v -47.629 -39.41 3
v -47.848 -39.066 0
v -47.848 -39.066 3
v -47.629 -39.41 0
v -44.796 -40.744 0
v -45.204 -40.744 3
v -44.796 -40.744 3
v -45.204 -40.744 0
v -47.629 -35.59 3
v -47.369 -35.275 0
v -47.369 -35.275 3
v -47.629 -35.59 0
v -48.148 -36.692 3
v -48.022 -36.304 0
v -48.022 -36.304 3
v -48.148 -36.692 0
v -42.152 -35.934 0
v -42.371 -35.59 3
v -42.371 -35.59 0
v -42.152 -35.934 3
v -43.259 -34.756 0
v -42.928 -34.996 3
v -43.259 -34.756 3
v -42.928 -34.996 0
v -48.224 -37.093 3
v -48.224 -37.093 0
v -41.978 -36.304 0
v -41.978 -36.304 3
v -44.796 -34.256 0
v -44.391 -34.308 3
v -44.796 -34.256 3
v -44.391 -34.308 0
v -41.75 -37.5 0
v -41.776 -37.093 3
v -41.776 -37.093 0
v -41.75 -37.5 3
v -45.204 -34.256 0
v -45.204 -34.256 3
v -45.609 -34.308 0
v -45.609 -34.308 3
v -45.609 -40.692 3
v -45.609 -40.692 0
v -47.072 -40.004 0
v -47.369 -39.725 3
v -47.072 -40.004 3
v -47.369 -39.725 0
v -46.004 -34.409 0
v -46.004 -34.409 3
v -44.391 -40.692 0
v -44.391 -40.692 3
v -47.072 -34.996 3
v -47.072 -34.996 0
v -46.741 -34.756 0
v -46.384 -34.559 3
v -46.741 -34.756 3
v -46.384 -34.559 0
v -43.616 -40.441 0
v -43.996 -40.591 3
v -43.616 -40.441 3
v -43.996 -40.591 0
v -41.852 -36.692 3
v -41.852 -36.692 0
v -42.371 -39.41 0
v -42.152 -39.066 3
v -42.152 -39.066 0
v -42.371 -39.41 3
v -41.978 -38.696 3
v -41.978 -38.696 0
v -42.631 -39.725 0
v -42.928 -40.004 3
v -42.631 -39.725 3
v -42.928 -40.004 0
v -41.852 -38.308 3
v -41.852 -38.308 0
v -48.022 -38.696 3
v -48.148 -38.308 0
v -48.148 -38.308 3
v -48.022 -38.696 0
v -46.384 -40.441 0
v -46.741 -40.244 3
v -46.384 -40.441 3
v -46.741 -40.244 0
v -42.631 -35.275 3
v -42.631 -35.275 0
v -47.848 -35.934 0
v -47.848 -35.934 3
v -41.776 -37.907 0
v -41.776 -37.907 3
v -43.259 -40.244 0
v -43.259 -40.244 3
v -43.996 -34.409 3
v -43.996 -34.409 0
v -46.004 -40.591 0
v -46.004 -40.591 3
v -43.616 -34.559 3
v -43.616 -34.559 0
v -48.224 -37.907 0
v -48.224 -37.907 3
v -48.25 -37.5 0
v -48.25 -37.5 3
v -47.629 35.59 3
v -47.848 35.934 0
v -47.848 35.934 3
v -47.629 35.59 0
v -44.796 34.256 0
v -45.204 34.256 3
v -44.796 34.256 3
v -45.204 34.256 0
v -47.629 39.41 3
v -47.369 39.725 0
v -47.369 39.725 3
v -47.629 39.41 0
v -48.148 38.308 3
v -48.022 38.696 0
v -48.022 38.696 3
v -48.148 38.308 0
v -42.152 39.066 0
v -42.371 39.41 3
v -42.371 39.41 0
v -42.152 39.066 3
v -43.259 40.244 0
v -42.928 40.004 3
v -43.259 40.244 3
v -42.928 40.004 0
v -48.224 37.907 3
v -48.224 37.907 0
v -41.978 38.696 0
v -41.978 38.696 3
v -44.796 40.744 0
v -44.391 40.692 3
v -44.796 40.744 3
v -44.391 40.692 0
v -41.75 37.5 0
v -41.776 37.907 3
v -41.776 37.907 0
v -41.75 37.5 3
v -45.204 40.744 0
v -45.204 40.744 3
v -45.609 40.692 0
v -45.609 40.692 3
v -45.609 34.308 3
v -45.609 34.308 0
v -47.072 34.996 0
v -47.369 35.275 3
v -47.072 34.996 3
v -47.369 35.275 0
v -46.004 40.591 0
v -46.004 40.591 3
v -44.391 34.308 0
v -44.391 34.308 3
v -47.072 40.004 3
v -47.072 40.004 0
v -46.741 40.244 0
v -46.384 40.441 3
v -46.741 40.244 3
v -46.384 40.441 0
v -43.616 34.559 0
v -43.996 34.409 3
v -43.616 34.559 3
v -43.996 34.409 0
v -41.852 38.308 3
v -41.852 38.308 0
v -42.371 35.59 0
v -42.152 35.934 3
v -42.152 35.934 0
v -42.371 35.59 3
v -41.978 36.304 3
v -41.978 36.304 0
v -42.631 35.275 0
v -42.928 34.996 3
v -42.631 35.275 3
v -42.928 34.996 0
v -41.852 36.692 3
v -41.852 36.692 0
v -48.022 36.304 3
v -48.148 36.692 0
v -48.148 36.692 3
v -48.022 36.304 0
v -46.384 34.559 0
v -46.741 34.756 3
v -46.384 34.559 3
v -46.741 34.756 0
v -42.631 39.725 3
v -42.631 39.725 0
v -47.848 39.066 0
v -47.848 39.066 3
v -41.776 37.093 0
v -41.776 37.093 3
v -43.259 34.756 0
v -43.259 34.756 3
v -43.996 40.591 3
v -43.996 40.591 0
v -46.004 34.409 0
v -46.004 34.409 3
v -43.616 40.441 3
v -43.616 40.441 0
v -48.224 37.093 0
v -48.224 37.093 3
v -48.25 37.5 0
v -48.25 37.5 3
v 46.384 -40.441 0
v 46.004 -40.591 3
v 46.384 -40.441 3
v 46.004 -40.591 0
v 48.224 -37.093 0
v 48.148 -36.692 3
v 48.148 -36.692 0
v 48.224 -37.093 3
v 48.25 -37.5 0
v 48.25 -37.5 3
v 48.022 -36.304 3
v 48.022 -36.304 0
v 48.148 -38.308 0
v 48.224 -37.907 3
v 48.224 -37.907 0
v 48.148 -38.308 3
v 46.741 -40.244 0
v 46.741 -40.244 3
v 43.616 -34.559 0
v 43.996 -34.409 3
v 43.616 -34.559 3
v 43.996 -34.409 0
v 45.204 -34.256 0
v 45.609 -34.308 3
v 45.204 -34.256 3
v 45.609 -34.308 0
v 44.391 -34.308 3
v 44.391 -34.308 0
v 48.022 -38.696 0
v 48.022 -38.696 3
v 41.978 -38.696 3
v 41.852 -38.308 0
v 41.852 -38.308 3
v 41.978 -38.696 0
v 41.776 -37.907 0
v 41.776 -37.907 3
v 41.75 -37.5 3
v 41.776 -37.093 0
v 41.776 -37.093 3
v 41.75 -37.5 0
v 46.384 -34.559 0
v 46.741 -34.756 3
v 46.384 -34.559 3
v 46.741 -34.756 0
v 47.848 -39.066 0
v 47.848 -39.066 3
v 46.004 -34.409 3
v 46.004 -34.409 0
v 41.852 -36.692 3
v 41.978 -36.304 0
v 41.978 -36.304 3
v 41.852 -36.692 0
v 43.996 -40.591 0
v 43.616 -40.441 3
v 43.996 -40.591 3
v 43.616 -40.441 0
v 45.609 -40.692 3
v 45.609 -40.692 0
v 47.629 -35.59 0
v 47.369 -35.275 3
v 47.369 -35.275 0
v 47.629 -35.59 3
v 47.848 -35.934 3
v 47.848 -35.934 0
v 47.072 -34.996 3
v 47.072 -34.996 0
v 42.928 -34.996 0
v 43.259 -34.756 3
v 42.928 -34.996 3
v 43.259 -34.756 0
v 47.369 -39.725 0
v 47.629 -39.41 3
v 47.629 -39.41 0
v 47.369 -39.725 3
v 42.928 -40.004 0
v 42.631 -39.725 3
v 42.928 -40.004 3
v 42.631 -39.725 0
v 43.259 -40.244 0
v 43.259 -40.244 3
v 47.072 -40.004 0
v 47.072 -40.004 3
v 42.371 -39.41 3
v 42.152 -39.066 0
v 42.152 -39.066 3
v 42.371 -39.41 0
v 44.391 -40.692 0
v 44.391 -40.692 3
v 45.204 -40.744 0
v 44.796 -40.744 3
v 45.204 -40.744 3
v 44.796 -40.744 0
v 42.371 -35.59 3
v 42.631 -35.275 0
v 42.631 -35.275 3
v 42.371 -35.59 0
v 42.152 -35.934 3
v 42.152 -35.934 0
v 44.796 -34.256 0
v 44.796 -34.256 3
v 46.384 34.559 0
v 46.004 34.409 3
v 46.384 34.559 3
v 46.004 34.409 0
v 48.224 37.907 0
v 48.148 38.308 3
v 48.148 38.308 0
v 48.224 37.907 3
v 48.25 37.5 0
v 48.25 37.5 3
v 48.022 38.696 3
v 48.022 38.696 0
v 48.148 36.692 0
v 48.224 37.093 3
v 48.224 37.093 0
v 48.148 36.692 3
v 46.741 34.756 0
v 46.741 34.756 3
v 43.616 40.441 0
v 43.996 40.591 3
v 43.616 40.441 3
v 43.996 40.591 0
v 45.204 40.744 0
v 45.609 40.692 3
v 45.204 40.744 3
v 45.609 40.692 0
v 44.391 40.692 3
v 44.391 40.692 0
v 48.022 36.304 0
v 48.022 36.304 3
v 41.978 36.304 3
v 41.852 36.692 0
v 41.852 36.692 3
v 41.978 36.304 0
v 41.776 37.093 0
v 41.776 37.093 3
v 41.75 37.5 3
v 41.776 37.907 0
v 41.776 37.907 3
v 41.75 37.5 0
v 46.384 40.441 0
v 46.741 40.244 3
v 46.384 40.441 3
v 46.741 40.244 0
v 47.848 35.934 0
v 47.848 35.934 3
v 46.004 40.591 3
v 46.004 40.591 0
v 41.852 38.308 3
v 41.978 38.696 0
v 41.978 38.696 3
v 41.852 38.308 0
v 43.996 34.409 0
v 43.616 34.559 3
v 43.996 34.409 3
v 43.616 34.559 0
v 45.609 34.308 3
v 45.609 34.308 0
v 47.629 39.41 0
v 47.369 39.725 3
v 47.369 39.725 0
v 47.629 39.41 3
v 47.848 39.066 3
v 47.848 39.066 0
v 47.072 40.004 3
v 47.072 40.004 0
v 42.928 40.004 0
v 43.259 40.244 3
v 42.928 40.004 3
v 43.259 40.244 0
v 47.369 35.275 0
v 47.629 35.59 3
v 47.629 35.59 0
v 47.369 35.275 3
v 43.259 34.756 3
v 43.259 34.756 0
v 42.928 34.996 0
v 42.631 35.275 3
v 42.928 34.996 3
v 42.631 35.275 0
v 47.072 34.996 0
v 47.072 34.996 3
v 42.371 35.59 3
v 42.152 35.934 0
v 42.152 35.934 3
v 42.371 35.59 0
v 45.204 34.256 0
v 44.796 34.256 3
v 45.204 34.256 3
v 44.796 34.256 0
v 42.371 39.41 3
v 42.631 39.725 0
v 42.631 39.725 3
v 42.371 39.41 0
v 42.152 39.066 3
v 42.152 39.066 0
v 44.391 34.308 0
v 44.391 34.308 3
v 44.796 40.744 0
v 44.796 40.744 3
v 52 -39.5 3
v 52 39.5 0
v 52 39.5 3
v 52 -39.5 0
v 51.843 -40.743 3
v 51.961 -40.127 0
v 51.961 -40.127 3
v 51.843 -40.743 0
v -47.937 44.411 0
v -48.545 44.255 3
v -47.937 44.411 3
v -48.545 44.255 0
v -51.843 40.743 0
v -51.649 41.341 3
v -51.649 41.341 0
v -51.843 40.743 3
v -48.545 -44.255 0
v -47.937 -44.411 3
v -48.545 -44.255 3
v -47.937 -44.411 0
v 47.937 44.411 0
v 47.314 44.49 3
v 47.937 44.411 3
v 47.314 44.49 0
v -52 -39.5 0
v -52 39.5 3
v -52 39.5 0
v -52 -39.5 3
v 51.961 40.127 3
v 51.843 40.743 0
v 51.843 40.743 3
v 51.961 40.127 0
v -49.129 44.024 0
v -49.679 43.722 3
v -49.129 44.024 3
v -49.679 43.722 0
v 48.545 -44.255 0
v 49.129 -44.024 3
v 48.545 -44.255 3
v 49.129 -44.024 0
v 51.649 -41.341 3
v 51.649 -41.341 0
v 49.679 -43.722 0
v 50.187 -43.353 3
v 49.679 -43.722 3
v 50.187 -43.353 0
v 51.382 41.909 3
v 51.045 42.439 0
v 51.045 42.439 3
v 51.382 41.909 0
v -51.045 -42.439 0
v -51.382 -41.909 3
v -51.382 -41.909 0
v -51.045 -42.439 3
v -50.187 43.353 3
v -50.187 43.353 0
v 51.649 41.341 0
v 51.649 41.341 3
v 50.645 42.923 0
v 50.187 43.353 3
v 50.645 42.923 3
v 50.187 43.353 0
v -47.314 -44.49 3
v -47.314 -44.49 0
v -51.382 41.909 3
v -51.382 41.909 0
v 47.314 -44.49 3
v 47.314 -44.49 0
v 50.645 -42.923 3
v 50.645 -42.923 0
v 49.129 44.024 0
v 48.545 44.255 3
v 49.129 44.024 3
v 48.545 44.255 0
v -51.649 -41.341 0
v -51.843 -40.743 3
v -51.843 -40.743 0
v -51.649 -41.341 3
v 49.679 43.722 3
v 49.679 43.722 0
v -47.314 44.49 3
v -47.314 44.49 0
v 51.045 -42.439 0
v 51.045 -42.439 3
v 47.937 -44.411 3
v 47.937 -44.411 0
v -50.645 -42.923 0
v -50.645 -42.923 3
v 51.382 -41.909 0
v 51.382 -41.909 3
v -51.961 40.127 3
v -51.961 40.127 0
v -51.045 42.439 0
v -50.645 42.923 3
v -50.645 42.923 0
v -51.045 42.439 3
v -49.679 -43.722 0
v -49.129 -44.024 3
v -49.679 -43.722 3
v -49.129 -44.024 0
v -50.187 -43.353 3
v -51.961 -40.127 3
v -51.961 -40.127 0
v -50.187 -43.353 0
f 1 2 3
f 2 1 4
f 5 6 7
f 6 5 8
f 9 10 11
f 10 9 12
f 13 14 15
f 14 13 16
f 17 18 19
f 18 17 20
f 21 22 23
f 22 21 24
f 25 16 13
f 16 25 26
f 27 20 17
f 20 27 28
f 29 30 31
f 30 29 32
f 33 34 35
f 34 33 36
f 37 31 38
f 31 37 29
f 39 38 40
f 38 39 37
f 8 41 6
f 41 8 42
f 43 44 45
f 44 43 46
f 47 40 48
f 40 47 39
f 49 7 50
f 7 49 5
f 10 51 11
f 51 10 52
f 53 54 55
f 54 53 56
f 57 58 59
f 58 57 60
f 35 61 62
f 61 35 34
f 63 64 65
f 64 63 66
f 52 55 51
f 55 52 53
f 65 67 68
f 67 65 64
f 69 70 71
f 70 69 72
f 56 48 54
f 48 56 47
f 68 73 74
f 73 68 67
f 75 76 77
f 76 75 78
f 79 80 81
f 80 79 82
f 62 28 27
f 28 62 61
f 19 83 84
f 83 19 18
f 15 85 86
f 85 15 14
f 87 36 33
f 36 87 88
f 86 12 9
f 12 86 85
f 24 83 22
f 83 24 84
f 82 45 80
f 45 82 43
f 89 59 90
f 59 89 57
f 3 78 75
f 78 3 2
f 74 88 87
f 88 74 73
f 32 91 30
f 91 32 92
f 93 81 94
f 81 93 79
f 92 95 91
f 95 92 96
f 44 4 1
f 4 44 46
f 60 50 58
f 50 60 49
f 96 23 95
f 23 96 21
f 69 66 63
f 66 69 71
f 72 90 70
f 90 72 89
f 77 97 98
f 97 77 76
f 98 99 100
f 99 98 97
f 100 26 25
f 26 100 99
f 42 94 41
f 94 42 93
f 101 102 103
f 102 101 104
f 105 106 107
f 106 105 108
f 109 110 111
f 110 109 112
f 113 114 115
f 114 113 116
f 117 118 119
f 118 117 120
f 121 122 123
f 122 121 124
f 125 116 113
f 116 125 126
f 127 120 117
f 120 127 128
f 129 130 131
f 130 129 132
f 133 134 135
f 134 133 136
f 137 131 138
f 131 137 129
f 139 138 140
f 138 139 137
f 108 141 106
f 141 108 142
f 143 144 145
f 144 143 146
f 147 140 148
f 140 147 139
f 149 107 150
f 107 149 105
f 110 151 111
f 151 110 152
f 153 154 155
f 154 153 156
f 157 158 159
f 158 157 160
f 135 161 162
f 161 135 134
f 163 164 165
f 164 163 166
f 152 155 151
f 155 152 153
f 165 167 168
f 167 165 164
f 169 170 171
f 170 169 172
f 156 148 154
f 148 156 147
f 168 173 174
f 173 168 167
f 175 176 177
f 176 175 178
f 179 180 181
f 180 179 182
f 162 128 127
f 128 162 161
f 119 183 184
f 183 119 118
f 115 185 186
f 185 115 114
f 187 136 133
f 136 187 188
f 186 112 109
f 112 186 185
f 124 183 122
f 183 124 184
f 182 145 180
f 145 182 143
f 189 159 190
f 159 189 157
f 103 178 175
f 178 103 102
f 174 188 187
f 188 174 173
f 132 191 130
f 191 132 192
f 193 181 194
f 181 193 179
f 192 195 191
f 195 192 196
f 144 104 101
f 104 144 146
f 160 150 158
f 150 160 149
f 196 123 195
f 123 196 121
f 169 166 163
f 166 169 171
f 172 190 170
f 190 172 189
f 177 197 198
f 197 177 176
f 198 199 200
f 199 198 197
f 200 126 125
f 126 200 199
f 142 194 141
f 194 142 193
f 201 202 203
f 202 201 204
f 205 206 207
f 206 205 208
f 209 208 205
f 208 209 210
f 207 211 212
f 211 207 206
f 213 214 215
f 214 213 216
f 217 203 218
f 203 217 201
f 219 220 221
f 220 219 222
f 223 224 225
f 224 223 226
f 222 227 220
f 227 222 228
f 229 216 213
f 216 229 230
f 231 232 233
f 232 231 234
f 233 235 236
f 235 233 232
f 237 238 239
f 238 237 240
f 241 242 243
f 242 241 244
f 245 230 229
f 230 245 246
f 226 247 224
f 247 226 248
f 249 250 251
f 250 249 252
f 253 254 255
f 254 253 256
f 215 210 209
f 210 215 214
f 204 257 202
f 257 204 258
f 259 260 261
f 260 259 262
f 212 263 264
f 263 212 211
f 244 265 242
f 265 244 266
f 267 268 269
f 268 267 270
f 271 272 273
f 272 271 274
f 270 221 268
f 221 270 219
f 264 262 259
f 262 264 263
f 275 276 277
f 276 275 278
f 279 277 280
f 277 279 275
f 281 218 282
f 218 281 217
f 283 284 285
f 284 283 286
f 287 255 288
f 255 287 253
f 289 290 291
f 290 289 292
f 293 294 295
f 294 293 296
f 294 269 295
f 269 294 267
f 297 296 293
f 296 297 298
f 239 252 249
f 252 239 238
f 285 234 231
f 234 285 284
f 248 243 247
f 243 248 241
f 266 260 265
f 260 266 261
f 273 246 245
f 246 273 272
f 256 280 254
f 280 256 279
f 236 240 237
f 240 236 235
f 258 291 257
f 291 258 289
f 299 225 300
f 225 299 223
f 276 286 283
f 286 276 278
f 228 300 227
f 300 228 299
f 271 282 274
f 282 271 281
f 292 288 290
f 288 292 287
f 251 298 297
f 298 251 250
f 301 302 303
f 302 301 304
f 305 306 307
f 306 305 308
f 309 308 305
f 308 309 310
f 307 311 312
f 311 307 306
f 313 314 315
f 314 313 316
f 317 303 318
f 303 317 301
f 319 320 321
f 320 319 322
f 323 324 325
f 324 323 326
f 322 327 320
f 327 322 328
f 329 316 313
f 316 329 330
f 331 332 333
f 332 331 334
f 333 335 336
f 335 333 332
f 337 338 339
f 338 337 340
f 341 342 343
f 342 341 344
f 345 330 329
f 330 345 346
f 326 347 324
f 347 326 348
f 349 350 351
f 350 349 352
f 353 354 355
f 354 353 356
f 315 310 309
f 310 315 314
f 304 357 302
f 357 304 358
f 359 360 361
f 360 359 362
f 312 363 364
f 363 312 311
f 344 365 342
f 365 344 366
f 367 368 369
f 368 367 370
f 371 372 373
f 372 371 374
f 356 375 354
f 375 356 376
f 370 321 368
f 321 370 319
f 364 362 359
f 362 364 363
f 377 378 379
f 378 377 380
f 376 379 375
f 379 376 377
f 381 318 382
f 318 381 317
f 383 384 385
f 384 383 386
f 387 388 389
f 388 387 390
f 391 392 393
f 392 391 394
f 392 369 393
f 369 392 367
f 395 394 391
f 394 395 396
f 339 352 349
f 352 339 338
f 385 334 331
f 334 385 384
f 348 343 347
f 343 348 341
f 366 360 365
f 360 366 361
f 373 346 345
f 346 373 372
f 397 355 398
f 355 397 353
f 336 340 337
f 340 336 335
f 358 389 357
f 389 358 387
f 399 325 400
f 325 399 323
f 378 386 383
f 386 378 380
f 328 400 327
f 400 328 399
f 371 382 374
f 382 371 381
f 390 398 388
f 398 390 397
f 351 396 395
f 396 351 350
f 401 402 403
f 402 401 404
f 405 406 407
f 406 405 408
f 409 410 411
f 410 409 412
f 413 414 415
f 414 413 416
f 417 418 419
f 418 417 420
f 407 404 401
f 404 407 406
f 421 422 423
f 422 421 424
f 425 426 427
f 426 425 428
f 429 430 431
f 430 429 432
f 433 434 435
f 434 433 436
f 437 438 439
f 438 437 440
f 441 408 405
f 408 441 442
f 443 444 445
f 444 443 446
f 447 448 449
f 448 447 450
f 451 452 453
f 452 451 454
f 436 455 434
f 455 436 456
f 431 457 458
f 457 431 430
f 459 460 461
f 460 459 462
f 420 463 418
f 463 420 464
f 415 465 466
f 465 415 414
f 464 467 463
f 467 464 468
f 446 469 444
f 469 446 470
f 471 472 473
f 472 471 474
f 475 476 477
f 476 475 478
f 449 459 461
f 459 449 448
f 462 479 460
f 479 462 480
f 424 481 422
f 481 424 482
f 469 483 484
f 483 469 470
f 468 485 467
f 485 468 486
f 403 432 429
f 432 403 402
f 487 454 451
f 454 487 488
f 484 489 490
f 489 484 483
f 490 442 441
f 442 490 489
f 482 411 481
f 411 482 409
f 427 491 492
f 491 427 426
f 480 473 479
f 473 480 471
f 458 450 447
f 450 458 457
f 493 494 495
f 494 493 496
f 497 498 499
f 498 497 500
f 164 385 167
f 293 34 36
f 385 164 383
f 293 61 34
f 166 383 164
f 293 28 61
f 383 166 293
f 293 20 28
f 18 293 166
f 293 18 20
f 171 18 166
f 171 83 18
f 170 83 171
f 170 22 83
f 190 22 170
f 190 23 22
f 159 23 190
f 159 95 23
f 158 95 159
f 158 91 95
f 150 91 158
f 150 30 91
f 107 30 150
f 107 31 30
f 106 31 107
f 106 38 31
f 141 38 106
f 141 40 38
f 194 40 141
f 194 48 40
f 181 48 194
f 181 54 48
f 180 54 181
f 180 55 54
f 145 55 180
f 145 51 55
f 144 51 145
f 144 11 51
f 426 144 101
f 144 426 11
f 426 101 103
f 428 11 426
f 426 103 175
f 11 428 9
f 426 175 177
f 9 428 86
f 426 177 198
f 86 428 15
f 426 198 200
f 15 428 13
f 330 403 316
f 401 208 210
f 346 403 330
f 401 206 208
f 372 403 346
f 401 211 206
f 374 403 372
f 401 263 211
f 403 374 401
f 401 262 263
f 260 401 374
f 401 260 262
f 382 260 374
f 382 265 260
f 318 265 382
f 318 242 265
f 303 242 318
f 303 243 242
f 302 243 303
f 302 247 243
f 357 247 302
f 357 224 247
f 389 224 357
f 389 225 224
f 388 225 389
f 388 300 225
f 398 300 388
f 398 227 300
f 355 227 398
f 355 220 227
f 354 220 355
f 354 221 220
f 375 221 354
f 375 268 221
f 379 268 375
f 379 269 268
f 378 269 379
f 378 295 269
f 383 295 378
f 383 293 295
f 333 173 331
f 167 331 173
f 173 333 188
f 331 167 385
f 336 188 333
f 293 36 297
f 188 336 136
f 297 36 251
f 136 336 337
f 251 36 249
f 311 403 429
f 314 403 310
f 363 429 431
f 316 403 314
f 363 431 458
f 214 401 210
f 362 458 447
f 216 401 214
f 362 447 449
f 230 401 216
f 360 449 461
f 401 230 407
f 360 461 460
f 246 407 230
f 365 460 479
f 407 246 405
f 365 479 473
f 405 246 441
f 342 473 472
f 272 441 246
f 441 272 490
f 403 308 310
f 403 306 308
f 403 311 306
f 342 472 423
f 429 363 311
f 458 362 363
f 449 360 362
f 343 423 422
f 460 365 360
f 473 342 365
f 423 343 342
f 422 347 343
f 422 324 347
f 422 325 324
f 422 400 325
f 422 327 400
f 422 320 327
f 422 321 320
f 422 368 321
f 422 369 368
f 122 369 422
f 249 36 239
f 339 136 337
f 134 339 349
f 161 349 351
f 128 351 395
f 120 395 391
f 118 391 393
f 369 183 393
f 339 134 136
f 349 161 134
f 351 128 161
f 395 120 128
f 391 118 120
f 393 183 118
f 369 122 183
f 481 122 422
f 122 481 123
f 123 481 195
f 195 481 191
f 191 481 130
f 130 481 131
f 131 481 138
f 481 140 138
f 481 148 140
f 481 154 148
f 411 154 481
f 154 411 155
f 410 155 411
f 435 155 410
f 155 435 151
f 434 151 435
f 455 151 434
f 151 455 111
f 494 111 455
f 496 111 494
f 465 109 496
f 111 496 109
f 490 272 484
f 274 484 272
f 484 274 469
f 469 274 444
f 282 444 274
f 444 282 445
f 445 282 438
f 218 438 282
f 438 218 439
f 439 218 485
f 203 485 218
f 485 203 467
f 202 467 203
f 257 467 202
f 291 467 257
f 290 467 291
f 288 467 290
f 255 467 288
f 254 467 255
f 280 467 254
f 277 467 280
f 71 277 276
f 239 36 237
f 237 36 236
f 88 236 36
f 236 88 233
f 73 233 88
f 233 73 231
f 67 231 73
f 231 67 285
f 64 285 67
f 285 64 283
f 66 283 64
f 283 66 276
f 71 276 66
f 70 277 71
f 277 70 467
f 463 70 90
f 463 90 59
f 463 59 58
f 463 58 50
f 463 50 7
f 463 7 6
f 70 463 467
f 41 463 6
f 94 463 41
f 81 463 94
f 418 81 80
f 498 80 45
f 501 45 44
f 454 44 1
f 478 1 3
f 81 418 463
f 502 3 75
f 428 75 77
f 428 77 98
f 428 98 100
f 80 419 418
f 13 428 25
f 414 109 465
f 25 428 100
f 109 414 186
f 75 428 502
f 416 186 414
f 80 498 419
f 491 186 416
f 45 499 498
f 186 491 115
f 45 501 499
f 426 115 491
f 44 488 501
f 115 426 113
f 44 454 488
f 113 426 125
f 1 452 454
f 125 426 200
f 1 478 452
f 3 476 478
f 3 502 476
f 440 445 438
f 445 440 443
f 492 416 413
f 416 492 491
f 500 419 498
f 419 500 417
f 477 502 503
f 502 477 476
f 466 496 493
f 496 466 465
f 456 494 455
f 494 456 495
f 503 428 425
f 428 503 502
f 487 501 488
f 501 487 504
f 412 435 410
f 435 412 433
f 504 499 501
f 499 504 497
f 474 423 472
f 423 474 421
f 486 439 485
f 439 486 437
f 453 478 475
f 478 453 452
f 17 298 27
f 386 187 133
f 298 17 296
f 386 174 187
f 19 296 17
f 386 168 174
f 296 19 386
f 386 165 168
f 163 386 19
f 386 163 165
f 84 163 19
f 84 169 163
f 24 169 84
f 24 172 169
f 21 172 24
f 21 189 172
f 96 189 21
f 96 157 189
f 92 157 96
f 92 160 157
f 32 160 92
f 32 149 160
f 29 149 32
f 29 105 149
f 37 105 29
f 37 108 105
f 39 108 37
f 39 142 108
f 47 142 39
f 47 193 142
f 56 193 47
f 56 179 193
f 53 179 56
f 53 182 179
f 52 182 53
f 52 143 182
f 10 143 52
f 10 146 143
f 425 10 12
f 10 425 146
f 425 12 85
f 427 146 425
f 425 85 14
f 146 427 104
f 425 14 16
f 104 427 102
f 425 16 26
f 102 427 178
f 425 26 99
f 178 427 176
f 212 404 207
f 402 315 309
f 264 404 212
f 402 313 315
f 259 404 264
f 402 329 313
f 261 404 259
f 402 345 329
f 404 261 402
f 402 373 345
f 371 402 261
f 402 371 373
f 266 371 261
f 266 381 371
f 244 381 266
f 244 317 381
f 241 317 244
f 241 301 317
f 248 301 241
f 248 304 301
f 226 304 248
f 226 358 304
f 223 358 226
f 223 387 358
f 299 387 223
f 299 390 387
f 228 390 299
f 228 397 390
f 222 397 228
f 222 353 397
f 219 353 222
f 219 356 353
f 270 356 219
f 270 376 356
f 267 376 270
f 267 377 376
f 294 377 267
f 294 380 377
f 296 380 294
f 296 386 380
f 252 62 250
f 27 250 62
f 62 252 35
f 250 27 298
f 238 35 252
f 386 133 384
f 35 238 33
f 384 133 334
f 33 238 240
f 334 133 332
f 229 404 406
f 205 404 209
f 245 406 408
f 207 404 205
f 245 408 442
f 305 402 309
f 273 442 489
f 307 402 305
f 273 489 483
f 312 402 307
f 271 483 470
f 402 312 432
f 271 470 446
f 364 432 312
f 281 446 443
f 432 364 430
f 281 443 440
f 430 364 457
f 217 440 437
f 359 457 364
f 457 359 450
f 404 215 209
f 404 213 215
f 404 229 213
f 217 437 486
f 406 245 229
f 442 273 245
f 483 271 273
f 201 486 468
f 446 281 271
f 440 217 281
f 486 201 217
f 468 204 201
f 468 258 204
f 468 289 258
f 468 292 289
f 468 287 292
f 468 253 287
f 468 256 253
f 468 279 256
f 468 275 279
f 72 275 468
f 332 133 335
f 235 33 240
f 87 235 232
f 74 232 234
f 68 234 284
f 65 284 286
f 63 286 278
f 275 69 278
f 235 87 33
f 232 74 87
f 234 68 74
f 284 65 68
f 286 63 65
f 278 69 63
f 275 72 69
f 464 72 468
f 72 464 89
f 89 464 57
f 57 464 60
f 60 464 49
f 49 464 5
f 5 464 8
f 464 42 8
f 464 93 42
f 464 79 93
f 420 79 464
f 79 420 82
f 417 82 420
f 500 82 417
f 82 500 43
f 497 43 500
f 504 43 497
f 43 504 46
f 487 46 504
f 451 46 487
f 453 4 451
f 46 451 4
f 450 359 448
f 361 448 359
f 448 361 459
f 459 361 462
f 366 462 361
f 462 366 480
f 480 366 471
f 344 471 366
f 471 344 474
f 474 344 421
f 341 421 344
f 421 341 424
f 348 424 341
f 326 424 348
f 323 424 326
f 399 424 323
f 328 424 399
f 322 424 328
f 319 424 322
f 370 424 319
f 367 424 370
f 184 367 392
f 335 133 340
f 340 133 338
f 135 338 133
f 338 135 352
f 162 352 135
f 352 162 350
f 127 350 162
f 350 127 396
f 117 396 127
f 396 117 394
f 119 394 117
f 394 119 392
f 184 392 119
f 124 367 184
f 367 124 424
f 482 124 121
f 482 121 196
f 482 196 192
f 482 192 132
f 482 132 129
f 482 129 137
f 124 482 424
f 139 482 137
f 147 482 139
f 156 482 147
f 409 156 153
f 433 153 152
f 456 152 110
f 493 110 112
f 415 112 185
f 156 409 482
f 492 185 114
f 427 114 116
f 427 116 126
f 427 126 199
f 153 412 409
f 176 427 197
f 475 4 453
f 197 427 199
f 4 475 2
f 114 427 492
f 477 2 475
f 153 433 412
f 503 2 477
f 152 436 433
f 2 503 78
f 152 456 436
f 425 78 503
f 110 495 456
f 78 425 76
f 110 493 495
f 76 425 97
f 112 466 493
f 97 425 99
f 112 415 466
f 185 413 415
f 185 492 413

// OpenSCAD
$fn = 50;


difference() {
	union() {
		hull() {
			translate(v = [-47.0000000000, 39.5000000000, 0]) {
				cylinder(h = 3, r = 5);
			}
			translate(v = [47.0000000000, 39.5000000000, 0]) {
				cylinder(h = 3, r = 5);
			}
			translate(v = [-47.0000000000, -39.5000000000, 0]) {
				cylinder(h = 3, r = 5);
			}
			translate(v = [47.0000000000, -39.5000000000, 0]) {
				cylinder(h = 3, r = 5);
			}
		}
	}
	union() {
		translate(v = [-45.0000000000, -37.5000000000, -100.0000000000]) {
			cylinder(h = 200, r = 3.2500000000);
		}
		translate(v = [-45.0000000000, 37.5000000000, -100.0000000000]) {
			cylinder(h = 200, r = 3.2500000000);
		}
		translate(v = [45.0000000000, -37.5000000000, -100.0000000000]) {
			cylinder(h = 200, r = 3.2500000000);
		}
		translate(v = [45.0000000000, 37.5000000000, -100.0000000000]) {
			cylinder(h = 200, r = 3.2500000000);
		}
	}
}
